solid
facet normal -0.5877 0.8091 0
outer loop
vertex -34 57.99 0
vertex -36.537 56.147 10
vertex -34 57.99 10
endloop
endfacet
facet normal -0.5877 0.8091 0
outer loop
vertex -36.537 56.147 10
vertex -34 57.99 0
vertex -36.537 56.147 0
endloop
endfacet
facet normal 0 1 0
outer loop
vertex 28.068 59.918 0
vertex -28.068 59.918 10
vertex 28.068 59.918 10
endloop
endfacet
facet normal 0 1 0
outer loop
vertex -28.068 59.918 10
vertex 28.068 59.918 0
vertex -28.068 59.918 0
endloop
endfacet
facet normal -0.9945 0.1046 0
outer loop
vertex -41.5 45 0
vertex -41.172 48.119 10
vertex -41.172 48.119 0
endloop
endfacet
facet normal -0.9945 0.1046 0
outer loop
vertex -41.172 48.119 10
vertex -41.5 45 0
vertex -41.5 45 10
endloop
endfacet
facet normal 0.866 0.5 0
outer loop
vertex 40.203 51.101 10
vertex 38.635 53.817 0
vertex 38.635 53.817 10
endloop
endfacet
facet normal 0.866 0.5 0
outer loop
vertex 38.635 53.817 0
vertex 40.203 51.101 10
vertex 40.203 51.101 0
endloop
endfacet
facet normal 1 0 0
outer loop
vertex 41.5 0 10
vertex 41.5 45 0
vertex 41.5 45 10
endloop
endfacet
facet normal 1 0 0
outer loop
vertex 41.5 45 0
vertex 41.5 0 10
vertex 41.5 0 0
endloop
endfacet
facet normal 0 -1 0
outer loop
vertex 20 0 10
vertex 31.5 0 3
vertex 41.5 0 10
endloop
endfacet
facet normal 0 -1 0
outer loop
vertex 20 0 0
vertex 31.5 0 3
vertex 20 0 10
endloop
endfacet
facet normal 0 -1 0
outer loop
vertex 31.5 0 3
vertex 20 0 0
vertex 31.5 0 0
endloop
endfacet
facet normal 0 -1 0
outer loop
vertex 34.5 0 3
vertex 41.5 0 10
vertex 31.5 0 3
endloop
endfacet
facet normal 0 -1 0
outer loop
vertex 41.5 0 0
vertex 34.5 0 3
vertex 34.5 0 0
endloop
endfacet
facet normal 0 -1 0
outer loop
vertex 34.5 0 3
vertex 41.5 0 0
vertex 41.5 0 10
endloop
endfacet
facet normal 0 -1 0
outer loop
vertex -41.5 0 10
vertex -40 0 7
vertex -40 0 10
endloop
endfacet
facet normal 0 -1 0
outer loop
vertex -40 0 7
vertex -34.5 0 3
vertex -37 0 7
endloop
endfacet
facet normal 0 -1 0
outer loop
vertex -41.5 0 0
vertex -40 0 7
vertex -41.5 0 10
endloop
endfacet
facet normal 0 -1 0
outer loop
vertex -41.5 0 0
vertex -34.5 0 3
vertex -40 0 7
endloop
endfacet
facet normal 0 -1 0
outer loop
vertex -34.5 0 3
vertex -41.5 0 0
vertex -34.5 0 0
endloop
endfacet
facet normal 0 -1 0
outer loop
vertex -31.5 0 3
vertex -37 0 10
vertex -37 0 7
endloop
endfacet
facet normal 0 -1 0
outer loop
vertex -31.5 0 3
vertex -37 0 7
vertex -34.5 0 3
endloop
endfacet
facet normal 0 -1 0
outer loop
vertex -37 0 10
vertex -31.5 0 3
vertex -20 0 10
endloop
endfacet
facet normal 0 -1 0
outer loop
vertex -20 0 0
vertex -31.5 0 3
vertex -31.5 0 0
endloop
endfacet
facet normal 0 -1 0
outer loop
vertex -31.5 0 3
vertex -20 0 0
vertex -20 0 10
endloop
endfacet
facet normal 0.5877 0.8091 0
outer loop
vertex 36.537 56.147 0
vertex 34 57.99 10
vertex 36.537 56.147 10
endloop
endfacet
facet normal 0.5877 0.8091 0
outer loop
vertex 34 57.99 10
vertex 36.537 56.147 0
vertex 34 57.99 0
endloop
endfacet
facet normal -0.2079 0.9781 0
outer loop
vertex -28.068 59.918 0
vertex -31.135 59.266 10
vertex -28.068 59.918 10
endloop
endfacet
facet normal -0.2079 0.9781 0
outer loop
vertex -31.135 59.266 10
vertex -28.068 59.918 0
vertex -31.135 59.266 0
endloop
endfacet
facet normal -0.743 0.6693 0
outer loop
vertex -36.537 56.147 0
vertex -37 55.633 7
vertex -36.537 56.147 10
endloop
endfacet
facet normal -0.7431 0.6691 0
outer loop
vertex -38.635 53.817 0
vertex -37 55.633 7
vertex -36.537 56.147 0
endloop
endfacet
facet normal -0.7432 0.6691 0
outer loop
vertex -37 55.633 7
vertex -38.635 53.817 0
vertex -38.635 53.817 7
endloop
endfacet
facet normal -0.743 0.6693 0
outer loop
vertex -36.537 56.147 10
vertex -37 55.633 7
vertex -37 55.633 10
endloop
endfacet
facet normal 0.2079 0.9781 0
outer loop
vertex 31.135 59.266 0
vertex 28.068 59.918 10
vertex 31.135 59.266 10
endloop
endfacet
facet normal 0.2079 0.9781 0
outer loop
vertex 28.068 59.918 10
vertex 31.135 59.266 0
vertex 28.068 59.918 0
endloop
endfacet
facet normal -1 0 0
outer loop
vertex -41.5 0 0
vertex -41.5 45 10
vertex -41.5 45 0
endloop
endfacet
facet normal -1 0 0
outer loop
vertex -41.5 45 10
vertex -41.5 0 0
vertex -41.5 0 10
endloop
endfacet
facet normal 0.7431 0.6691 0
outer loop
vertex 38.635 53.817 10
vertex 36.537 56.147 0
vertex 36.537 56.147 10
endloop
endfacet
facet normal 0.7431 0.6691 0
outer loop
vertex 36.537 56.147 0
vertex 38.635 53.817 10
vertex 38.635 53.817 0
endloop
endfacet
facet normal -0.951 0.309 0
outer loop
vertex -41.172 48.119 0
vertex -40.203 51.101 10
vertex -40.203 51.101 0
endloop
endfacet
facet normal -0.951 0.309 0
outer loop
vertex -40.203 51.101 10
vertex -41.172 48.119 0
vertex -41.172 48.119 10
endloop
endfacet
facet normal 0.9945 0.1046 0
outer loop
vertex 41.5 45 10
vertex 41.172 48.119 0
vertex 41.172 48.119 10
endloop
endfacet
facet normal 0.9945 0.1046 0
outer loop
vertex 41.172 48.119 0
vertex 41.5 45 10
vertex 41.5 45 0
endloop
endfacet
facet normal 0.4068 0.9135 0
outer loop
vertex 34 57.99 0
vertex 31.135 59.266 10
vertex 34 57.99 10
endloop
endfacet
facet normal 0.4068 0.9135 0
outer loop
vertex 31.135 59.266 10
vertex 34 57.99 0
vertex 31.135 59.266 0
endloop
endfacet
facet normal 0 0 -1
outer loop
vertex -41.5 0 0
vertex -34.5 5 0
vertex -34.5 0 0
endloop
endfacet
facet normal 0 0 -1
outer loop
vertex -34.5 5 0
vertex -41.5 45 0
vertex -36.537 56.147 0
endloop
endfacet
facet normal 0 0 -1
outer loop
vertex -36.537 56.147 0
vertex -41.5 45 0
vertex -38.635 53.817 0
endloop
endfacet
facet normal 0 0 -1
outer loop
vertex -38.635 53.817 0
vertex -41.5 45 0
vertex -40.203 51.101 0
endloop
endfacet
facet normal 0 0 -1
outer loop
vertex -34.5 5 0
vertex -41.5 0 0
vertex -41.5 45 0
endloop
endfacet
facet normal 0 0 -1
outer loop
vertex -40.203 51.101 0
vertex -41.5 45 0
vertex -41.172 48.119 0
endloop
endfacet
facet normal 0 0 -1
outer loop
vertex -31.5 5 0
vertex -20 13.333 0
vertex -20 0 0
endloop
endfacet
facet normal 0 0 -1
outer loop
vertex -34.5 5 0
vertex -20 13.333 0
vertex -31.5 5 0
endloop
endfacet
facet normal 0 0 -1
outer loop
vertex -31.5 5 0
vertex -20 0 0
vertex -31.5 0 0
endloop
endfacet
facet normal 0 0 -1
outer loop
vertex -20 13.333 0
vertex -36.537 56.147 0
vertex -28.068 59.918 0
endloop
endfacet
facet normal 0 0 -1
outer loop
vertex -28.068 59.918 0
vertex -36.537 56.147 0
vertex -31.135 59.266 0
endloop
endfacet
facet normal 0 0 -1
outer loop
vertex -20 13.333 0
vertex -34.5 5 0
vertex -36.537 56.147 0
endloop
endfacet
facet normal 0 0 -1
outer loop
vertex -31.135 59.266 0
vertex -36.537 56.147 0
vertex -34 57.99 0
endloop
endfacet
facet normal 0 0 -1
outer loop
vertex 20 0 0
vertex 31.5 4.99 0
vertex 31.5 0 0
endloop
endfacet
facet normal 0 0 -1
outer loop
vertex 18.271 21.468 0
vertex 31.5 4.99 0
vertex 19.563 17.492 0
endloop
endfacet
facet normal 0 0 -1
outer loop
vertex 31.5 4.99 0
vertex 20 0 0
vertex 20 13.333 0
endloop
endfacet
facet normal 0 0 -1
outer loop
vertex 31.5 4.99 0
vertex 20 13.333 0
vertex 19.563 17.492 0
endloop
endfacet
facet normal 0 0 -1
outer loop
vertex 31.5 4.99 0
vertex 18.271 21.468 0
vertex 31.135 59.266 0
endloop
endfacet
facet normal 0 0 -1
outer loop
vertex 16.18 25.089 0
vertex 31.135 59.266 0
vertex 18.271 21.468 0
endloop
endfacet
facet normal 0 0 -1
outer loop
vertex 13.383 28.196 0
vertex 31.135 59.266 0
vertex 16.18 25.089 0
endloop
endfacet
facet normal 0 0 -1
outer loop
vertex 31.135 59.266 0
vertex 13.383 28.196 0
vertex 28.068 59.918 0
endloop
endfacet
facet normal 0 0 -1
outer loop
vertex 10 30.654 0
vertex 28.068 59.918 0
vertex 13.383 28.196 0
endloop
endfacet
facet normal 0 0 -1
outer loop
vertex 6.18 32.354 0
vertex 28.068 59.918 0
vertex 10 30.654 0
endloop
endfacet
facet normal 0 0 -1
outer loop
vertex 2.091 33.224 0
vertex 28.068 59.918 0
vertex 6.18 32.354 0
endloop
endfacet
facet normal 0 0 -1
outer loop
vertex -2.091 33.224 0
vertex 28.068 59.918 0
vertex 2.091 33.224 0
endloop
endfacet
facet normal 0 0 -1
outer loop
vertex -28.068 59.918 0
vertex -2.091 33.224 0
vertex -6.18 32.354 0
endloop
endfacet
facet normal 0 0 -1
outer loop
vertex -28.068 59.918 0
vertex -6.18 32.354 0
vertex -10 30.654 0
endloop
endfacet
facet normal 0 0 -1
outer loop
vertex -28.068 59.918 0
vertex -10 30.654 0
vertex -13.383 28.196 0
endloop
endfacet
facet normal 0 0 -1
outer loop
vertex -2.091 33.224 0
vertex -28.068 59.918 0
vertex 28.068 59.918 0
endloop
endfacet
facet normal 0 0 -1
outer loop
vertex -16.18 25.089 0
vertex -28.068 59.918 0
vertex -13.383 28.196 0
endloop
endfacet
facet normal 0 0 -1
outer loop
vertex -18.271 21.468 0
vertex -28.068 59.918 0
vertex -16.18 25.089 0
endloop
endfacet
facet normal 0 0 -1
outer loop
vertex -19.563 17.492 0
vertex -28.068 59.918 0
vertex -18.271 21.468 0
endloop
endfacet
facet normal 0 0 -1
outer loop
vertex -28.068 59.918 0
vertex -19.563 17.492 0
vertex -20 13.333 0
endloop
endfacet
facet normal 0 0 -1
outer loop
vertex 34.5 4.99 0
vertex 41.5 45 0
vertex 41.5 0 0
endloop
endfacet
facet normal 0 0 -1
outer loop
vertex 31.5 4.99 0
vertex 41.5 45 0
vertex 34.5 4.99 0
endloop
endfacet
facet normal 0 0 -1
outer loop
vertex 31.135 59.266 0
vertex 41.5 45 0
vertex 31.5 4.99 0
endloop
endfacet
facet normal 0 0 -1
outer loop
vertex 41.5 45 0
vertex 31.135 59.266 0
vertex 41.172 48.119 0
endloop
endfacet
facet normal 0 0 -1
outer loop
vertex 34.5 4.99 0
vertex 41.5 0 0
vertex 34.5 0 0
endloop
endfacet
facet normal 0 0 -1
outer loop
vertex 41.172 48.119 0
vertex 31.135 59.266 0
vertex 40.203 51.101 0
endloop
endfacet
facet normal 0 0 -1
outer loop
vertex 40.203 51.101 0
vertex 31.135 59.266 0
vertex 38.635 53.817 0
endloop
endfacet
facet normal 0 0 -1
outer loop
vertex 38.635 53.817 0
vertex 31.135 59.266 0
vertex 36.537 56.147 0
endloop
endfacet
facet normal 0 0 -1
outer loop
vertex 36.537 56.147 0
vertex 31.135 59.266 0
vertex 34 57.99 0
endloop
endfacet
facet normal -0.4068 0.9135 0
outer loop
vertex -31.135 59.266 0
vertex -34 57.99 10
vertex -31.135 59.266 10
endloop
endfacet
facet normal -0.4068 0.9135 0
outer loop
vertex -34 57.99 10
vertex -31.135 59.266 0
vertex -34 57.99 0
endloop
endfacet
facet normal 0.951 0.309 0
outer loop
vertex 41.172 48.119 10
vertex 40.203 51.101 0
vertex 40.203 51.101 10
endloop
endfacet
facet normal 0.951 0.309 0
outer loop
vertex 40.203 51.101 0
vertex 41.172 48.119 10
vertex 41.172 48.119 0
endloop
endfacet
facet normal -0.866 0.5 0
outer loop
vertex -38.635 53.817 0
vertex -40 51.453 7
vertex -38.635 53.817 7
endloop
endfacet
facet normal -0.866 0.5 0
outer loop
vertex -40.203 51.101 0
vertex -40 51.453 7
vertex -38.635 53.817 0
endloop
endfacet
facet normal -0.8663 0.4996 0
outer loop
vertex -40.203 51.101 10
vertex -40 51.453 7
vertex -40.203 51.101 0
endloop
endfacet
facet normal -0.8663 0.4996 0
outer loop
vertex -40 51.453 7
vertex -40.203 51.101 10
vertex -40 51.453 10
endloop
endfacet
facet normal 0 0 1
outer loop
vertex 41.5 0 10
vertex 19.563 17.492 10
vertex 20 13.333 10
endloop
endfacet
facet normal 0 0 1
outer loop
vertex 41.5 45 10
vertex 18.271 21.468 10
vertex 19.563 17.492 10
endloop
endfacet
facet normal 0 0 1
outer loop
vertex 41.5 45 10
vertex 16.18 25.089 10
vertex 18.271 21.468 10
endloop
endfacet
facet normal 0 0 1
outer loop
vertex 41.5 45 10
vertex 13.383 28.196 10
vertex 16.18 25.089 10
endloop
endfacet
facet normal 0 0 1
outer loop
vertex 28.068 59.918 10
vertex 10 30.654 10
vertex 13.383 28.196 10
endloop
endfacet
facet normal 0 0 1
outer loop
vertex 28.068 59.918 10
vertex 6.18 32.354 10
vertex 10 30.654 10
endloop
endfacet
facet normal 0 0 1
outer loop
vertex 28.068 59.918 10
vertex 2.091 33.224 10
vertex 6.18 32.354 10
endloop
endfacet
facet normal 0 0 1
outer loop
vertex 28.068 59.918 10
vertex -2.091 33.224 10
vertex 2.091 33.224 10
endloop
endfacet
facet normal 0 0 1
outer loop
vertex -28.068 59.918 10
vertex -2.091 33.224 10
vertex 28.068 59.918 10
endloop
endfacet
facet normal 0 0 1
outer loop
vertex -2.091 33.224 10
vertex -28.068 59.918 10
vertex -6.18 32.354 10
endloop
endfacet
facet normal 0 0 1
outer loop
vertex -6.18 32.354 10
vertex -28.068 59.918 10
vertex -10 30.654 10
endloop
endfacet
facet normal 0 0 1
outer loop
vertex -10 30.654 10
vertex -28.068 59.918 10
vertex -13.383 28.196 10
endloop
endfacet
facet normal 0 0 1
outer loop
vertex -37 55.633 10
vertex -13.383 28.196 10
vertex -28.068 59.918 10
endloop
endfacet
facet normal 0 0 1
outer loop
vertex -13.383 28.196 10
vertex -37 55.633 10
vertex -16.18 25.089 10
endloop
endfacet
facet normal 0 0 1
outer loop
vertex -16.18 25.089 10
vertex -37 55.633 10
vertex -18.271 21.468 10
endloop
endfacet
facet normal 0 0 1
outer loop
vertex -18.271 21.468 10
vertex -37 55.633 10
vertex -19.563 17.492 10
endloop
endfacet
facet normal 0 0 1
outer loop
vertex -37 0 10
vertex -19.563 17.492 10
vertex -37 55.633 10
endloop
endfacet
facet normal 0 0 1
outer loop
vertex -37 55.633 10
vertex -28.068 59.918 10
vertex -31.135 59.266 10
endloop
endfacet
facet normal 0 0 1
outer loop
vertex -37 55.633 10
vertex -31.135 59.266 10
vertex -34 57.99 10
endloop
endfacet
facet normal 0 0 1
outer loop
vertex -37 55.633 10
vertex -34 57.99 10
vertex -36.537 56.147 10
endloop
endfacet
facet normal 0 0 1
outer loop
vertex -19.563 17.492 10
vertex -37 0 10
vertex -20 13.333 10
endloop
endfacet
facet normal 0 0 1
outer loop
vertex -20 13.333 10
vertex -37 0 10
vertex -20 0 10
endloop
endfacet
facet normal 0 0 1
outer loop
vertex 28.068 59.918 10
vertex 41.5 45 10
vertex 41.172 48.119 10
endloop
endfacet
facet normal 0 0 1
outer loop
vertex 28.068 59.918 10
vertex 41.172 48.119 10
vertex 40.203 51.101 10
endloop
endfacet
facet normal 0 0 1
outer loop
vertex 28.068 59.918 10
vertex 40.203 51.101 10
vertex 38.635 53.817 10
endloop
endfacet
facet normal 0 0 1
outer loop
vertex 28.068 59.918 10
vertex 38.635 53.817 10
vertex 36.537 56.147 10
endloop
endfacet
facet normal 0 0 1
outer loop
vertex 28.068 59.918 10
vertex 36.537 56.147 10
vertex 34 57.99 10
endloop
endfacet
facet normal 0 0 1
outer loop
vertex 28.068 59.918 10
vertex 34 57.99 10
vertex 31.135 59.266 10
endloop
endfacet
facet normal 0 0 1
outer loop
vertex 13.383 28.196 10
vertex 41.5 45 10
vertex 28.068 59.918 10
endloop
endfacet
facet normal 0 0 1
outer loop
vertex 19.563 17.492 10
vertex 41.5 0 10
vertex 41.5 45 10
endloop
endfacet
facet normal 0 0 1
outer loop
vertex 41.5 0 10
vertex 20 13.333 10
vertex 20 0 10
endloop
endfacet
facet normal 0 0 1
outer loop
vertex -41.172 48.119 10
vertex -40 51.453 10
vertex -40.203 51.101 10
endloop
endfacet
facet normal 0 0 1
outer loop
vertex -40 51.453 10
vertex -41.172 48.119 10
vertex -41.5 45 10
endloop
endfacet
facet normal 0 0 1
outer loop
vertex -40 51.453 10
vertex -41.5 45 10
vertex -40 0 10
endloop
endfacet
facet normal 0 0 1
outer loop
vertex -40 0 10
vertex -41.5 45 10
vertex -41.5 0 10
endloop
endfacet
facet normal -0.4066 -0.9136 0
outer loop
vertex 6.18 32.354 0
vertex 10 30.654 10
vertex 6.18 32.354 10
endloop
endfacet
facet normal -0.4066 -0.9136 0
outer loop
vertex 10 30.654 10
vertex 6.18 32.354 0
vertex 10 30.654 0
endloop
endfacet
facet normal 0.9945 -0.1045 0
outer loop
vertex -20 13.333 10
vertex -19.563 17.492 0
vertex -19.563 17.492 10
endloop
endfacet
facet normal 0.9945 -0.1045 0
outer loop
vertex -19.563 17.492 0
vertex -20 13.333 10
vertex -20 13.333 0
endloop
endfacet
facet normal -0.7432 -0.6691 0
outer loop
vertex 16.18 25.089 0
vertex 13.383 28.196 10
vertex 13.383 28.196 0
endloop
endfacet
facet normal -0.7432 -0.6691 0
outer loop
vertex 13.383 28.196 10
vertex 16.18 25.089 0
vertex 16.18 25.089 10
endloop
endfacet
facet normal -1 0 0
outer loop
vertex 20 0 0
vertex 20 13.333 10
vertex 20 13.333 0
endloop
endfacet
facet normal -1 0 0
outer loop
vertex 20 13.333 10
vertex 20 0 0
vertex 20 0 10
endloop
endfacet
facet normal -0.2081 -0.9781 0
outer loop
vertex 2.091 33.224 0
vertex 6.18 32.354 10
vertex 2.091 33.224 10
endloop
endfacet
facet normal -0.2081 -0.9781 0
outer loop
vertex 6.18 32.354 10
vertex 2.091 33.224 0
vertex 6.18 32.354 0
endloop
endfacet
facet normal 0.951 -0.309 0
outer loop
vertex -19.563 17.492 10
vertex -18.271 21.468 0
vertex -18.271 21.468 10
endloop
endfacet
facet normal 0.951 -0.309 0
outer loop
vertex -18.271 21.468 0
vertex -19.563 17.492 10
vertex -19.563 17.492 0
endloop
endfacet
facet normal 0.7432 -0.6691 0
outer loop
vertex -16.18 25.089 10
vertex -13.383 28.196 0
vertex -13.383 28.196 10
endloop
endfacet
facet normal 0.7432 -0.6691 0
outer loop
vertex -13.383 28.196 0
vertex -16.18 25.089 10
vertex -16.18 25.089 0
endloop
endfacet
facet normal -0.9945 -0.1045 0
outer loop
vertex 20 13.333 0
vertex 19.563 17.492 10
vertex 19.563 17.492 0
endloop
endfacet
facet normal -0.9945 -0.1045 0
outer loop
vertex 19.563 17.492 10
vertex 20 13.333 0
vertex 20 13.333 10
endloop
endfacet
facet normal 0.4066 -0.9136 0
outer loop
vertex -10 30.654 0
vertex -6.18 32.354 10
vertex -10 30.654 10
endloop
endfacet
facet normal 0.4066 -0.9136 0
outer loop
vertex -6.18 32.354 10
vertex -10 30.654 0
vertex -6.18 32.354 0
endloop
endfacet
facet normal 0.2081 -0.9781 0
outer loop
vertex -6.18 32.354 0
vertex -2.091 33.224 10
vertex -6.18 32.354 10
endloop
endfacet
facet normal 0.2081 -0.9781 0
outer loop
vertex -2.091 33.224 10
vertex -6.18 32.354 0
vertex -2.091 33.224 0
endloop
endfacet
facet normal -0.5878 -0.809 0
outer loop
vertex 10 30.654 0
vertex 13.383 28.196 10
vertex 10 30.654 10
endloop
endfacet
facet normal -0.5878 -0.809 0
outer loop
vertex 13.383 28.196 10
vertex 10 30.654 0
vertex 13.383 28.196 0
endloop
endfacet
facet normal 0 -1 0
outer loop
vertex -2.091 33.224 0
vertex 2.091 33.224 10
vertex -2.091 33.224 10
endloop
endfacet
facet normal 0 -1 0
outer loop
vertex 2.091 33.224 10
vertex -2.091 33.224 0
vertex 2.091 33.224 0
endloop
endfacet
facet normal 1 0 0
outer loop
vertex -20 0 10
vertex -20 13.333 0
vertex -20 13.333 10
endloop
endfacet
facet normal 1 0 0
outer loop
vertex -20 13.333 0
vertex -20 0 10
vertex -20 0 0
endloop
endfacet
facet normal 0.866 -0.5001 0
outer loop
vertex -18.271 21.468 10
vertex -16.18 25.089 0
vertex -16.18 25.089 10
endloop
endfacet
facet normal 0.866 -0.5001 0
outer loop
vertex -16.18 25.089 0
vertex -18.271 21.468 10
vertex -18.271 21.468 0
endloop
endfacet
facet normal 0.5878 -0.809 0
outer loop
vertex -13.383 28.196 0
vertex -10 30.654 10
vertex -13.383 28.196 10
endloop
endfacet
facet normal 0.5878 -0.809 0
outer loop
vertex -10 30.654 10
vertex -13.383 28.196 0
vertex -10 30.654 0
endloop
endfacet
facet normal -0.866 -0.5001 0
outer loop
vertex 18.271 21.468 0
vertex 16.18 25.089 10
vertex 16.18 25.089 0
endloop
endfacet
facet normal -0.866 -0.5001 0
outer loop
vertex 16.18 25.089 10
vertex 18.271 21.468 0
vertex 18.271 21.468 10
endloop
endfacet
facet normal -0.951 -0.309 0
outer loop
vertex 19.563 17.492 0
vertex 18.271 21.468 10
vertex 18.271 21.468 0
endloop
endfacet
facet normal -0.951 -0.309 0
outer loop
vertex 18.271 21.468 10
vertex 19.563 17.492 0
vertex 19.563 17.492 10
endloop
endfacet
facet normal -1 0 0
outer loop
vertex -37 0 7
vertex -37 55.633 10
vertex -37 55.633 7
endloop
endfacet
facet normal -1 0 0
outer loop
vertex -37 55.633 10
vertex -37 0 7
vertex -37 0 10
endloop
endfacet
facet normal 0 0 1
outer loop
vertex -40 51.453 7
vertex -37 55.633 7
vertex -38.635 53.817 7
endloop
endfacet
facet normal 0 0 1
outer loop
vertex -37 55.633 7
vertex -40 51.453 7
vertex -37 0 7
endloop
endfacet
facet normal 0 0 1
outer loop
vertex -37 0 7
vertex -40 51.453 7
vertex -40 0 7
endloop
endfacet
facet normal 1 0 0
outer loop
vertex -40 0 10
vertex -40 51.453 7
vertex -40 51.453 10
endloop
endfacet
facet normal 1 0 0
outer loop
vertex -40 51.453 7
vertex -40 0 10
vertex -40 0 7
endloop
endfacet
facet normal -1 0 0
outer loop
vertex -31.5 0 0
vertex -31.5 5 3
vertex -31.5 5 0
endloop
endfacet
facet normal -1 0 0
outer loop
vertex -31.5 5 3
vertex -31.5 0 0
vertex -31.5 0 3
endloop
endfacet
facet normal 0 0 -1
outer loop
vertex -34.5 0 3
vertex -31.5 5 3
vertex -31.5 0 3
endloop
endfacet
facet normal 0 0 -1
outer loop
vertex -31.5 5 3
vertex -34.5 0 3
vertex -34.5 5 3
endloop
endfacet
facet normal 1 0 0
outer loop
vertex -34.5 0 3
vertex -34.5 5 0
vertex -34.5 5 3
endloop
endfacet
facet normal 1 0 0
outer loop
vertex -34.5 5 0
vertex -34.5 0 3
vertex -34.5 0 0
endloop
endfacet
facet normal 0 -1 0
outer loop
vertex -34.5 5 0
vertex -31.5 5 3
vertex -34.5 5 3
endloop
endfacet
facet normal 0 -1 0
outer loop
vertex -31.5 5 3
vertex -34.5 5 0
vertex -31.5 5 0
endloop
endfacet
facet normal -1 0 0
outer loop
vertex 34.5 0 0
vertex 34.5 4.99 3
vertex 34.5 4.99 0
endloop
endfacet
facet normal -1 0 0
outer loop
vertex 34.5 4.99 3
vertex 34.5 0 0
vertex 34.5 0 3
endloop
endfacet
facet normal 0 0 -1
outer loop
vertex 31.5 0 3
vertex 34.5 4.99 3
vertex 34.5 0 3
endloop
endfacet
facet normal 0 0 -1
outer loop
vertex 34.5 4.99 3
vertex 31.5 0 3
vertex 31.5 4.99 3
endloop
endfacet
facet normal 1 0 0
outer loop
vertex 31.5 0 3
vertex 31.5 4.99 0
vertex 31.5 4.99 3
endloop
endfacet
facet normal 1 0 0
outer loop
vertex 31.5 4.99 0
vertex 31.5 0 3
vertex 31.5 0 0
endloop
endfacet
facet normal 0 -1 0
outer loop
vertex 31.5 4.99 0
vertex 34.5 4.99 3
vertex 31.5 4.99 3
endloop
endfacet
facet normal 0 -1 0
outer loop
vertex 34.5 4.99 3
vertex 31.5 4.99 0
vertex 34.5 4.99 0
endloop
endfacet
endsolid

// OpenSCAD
thick = 10;
width = 83;
height = 60;
round_radius = 15;
hole_d = 40;

difference() {
    hull() {
        translate([-width/2, 0, 0]) cube([width, 1, thick]);
        translate([-width/2+round_radius, height-round_radius, 0]) cylinder(r=round_radius, h=thick);
        translate([width/2-round_radius, height-round_radius, 0]) cylinder(r=round_radius, h=thick);
    }
    hull() {
        translate([0,hole_d/3]) cylinder(d=hole_d, h=thick);
        cylinder(d=hole_d, h=thick);
    }
    // pins
    //translate([width/2-4.5, 0, 0]) cube([3, height, 3]);
    translate([-width/2+1.5, 0, thick-3]) cube([3, height, 3]);
    #translate([-width/2+7,0,0]) cube([3, 5, 3]);
    #translate([width/2-10,-0.01,0]) cube([3, 5, 3]);
}
